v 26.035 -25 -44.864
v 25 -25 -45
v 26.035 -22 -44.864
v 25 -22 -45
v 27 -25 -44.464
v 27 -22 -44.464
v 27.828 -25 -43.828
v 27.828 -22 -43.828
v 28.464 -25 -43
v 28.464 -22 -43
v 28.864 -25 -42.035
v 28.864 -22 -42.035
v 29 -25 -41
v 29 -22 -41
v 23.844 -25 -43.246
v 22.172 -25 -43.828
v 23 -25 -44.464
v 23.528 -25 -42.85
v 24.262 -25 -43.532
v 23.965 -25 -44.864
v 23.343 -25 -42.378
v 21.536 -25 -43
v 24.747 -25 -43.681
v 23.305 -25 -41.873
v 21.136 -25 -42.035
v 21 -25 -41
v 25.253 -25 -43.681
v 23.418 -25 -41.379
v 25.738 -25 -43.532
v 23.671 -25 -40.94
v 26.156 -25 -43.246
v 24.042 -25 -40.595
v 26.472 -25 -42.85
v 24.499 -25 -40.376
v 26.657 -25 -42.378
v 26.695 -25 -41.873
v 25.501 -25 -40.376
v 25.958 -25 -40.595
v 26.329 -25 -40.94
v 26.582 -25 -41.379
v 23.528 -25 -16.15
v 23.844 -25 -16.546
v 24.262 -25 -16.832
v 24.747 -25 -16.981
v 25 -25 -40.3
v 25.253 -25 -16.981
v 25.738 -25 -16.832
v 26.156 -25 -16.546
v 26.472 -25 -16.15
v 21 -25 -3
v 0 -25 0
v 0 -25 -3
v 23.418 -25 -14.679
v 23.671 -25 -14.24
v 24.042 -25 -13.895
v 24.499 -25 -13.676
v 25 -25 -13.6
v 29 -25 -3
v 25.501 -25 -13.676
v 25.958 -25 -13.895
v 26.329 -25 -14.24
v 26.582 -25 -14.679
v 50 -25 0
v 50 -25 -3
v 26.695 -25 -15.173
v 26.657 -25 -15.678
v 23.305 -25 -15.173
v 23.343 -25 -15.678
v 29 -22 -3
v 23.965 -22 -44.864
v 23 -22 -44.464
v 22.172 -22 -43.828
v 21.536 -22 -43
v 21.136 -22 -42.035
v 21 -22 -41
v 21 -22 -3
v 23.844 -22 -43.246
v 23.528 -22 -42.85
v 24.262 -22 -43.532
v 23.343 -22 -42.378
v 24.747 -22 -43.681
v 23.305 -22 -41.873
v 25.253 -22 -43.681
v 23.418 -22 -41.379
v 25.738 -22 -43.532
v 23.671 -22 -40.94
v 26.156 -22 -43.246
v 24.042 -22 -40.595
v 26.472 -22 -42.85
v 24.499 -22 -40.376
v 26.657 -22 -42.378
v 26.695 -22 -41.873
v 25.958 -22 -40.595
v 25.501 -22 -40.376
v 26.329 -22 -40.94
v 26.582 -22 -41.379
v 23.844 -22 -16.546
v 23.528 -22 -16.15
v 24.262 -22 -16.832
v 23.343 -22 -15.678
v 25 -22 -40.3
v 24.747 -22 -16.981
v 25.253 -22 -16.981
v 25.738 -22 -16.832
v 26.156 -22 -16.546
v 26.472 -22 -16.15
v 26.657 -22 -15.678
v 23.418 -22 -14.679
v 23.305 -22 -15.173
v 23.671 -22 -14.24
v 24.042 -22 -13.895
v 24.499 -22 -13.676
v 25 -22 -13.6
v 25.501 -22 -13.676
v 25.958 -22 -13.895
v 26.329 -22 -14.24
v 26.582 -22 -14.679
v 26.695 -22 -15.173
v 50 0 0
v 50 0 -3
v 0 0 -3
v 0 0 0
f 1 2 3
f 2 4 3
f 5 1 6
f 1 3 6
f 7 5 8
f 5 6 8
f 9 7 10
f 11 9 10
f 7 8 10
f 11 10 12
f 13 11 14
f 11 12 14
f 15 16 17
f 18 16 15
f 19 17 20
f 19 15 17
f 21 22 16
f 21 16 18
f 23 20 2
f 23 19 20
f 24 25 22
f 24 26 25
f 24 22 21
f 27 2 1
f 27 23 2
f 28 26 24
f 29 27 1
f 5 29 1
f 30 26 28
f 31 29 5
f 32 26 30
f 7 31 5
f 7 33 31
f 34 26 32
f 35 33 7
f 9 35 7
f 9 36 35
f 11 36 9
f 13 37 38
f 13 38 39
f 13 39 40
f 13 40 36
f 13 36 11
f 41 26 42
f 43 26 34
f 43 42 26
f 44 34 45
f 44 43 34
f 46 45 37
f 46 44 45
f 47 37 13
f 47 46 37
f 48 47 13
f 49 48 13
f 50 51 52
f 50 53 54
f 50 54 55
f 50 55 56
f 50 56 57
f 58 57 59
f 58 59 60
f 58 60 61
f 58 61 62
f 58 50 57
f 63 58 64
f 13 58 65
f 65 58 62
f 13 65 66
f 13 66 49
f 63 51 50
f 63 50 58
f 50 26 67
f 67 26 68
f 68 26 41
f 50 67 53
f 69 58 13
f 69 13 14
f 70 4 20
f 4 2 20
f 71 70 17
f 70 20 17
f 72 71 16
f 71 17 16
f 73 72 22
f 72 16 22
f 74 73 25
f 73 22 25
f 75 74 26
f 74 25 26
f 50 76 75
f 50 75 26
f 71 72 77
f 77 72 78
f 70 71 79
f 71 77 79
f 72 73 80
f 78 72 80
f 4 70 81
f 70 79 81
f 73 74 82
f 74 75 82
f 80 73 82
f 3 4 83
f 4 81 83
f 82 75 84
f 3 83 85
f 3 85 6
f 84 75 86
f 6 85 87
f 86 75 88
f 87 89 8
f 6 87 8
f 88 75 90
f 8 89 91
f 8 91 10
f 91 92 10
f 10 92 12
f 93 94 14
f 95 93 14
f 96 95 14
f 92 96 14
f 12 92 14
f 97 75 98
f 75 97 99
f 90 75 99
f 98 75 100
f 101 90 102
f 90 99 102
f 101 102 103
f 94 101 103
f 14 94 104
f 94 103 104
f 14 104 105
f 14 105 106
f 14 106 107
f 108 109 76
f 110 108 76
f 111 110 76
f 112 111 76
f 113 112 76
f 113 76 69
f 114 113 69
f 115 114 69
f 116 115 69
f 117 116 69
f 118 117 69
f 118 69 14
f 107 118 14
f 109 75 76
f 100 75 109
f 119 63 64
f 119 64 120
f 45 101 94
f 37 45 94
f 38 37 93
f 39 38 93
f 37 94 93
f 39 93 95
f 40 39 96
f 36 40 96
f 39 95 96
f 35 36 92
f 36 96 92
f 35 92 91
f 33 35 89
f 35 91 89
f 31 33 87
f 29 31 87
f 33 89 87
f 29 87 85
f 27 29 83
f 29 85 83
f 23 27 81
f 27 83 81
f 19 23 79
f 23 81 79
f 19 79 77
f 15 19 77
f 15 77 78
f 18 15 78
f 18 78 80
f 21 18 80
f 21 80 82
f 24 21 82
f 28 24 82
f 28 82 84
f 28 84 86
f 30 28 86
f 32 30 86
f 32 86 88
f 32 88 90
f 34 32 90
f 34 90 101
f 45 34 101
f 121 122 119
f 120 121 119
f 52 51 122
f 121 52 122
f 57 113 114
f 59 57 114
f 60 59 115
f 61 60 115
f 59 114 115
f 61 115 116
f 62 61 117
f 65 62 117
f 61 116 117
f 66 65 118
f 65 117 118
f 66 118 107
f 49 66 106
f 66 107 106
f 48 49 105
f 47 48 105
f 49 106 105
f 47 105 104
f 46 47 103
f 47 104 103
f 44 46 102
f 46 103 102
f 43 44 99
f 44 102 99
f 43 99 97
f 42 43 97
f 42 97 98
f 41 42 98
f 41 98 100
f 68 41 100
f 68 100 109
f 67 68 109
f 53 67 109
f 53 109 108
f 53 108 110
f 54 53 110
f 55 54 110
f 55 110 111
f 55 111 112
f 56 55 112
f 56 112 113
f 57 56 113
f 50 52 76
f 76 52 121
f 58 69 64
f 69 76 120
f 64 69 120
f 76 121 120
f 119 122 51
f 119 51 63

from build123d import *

# Parameters (mm, degrees)
SKETCH1_W           = 50
SKETCH1_H           = 25
BOSS_EXTRUDE1_DEPTH = 3
BOSS_EXTRUDE2_DEPTH = 42
SKETCH3_R           = 1.7
CUT_EXTRUDE1_DEPTH  = 71.774289117
FILLET2_R           = 4
FILLET3_R           = 4


with BuildPart() as part:
    # Sketch1 → Boss-Extrude1 (new body)
    with BuildSketch(Plane.XY):
        with Locations((25, -12.5)):
            Rectangle(SKETCH1_W, SKETCH1_H)
    extrude(amount=-BOSS_EXTRUDE1_DEPTH)

    # Sketch2 → Boss-Extrude2 (add)
    with BuildSketch(Plane(origin=(0, 0, -3), x_dir=(-1, 0, 0), z_dir=(0, 0, -1))):
        Polygon((-25, -25), (-29, -25), (-29, -22), (-25, -22), (-21, -22), (-21, -25), align=None)
    extrude(amount=BOSS_EXTRUDE2_DEPTH)

    # Sketch3 → Cut-Extrude1 (cut, through all)
    with BuildSketch(Plane(origin=(0, -22, 0), x_dir=(1, 0, 0), z_dir=(0, 1, 0))):
        with Locations(Location((25, 42, 0), (0, 0, 270))):
            Circle(SKETCH3_R)
        with Locations(Location((25, 15.3, 0), (0, 0, 270))):
            Circle(SKETCH3_R)
    extrude(amount=-CUT_EXTRUDE1_DEPTH, mode=Mode.SUBTRACT)

    # Fillet2
    fillet2_edges = [part.edges().sort_by_distance(p)[0] for p in [
        (29, -23.5, -45),
    ]]
    fillet(fillet2_edges, radius=FILLET2_R)

    # Fillet3
    fillet3_edges = [part.edges().sort_by_distance(p)[0] for p in [
        (21, -23.5, -45),
    ]]
    fillet(fillet3_edges, radius=FILLET3_R - 0.0001)  # a hair under: the kernel refuses the full size


solid = part.part
